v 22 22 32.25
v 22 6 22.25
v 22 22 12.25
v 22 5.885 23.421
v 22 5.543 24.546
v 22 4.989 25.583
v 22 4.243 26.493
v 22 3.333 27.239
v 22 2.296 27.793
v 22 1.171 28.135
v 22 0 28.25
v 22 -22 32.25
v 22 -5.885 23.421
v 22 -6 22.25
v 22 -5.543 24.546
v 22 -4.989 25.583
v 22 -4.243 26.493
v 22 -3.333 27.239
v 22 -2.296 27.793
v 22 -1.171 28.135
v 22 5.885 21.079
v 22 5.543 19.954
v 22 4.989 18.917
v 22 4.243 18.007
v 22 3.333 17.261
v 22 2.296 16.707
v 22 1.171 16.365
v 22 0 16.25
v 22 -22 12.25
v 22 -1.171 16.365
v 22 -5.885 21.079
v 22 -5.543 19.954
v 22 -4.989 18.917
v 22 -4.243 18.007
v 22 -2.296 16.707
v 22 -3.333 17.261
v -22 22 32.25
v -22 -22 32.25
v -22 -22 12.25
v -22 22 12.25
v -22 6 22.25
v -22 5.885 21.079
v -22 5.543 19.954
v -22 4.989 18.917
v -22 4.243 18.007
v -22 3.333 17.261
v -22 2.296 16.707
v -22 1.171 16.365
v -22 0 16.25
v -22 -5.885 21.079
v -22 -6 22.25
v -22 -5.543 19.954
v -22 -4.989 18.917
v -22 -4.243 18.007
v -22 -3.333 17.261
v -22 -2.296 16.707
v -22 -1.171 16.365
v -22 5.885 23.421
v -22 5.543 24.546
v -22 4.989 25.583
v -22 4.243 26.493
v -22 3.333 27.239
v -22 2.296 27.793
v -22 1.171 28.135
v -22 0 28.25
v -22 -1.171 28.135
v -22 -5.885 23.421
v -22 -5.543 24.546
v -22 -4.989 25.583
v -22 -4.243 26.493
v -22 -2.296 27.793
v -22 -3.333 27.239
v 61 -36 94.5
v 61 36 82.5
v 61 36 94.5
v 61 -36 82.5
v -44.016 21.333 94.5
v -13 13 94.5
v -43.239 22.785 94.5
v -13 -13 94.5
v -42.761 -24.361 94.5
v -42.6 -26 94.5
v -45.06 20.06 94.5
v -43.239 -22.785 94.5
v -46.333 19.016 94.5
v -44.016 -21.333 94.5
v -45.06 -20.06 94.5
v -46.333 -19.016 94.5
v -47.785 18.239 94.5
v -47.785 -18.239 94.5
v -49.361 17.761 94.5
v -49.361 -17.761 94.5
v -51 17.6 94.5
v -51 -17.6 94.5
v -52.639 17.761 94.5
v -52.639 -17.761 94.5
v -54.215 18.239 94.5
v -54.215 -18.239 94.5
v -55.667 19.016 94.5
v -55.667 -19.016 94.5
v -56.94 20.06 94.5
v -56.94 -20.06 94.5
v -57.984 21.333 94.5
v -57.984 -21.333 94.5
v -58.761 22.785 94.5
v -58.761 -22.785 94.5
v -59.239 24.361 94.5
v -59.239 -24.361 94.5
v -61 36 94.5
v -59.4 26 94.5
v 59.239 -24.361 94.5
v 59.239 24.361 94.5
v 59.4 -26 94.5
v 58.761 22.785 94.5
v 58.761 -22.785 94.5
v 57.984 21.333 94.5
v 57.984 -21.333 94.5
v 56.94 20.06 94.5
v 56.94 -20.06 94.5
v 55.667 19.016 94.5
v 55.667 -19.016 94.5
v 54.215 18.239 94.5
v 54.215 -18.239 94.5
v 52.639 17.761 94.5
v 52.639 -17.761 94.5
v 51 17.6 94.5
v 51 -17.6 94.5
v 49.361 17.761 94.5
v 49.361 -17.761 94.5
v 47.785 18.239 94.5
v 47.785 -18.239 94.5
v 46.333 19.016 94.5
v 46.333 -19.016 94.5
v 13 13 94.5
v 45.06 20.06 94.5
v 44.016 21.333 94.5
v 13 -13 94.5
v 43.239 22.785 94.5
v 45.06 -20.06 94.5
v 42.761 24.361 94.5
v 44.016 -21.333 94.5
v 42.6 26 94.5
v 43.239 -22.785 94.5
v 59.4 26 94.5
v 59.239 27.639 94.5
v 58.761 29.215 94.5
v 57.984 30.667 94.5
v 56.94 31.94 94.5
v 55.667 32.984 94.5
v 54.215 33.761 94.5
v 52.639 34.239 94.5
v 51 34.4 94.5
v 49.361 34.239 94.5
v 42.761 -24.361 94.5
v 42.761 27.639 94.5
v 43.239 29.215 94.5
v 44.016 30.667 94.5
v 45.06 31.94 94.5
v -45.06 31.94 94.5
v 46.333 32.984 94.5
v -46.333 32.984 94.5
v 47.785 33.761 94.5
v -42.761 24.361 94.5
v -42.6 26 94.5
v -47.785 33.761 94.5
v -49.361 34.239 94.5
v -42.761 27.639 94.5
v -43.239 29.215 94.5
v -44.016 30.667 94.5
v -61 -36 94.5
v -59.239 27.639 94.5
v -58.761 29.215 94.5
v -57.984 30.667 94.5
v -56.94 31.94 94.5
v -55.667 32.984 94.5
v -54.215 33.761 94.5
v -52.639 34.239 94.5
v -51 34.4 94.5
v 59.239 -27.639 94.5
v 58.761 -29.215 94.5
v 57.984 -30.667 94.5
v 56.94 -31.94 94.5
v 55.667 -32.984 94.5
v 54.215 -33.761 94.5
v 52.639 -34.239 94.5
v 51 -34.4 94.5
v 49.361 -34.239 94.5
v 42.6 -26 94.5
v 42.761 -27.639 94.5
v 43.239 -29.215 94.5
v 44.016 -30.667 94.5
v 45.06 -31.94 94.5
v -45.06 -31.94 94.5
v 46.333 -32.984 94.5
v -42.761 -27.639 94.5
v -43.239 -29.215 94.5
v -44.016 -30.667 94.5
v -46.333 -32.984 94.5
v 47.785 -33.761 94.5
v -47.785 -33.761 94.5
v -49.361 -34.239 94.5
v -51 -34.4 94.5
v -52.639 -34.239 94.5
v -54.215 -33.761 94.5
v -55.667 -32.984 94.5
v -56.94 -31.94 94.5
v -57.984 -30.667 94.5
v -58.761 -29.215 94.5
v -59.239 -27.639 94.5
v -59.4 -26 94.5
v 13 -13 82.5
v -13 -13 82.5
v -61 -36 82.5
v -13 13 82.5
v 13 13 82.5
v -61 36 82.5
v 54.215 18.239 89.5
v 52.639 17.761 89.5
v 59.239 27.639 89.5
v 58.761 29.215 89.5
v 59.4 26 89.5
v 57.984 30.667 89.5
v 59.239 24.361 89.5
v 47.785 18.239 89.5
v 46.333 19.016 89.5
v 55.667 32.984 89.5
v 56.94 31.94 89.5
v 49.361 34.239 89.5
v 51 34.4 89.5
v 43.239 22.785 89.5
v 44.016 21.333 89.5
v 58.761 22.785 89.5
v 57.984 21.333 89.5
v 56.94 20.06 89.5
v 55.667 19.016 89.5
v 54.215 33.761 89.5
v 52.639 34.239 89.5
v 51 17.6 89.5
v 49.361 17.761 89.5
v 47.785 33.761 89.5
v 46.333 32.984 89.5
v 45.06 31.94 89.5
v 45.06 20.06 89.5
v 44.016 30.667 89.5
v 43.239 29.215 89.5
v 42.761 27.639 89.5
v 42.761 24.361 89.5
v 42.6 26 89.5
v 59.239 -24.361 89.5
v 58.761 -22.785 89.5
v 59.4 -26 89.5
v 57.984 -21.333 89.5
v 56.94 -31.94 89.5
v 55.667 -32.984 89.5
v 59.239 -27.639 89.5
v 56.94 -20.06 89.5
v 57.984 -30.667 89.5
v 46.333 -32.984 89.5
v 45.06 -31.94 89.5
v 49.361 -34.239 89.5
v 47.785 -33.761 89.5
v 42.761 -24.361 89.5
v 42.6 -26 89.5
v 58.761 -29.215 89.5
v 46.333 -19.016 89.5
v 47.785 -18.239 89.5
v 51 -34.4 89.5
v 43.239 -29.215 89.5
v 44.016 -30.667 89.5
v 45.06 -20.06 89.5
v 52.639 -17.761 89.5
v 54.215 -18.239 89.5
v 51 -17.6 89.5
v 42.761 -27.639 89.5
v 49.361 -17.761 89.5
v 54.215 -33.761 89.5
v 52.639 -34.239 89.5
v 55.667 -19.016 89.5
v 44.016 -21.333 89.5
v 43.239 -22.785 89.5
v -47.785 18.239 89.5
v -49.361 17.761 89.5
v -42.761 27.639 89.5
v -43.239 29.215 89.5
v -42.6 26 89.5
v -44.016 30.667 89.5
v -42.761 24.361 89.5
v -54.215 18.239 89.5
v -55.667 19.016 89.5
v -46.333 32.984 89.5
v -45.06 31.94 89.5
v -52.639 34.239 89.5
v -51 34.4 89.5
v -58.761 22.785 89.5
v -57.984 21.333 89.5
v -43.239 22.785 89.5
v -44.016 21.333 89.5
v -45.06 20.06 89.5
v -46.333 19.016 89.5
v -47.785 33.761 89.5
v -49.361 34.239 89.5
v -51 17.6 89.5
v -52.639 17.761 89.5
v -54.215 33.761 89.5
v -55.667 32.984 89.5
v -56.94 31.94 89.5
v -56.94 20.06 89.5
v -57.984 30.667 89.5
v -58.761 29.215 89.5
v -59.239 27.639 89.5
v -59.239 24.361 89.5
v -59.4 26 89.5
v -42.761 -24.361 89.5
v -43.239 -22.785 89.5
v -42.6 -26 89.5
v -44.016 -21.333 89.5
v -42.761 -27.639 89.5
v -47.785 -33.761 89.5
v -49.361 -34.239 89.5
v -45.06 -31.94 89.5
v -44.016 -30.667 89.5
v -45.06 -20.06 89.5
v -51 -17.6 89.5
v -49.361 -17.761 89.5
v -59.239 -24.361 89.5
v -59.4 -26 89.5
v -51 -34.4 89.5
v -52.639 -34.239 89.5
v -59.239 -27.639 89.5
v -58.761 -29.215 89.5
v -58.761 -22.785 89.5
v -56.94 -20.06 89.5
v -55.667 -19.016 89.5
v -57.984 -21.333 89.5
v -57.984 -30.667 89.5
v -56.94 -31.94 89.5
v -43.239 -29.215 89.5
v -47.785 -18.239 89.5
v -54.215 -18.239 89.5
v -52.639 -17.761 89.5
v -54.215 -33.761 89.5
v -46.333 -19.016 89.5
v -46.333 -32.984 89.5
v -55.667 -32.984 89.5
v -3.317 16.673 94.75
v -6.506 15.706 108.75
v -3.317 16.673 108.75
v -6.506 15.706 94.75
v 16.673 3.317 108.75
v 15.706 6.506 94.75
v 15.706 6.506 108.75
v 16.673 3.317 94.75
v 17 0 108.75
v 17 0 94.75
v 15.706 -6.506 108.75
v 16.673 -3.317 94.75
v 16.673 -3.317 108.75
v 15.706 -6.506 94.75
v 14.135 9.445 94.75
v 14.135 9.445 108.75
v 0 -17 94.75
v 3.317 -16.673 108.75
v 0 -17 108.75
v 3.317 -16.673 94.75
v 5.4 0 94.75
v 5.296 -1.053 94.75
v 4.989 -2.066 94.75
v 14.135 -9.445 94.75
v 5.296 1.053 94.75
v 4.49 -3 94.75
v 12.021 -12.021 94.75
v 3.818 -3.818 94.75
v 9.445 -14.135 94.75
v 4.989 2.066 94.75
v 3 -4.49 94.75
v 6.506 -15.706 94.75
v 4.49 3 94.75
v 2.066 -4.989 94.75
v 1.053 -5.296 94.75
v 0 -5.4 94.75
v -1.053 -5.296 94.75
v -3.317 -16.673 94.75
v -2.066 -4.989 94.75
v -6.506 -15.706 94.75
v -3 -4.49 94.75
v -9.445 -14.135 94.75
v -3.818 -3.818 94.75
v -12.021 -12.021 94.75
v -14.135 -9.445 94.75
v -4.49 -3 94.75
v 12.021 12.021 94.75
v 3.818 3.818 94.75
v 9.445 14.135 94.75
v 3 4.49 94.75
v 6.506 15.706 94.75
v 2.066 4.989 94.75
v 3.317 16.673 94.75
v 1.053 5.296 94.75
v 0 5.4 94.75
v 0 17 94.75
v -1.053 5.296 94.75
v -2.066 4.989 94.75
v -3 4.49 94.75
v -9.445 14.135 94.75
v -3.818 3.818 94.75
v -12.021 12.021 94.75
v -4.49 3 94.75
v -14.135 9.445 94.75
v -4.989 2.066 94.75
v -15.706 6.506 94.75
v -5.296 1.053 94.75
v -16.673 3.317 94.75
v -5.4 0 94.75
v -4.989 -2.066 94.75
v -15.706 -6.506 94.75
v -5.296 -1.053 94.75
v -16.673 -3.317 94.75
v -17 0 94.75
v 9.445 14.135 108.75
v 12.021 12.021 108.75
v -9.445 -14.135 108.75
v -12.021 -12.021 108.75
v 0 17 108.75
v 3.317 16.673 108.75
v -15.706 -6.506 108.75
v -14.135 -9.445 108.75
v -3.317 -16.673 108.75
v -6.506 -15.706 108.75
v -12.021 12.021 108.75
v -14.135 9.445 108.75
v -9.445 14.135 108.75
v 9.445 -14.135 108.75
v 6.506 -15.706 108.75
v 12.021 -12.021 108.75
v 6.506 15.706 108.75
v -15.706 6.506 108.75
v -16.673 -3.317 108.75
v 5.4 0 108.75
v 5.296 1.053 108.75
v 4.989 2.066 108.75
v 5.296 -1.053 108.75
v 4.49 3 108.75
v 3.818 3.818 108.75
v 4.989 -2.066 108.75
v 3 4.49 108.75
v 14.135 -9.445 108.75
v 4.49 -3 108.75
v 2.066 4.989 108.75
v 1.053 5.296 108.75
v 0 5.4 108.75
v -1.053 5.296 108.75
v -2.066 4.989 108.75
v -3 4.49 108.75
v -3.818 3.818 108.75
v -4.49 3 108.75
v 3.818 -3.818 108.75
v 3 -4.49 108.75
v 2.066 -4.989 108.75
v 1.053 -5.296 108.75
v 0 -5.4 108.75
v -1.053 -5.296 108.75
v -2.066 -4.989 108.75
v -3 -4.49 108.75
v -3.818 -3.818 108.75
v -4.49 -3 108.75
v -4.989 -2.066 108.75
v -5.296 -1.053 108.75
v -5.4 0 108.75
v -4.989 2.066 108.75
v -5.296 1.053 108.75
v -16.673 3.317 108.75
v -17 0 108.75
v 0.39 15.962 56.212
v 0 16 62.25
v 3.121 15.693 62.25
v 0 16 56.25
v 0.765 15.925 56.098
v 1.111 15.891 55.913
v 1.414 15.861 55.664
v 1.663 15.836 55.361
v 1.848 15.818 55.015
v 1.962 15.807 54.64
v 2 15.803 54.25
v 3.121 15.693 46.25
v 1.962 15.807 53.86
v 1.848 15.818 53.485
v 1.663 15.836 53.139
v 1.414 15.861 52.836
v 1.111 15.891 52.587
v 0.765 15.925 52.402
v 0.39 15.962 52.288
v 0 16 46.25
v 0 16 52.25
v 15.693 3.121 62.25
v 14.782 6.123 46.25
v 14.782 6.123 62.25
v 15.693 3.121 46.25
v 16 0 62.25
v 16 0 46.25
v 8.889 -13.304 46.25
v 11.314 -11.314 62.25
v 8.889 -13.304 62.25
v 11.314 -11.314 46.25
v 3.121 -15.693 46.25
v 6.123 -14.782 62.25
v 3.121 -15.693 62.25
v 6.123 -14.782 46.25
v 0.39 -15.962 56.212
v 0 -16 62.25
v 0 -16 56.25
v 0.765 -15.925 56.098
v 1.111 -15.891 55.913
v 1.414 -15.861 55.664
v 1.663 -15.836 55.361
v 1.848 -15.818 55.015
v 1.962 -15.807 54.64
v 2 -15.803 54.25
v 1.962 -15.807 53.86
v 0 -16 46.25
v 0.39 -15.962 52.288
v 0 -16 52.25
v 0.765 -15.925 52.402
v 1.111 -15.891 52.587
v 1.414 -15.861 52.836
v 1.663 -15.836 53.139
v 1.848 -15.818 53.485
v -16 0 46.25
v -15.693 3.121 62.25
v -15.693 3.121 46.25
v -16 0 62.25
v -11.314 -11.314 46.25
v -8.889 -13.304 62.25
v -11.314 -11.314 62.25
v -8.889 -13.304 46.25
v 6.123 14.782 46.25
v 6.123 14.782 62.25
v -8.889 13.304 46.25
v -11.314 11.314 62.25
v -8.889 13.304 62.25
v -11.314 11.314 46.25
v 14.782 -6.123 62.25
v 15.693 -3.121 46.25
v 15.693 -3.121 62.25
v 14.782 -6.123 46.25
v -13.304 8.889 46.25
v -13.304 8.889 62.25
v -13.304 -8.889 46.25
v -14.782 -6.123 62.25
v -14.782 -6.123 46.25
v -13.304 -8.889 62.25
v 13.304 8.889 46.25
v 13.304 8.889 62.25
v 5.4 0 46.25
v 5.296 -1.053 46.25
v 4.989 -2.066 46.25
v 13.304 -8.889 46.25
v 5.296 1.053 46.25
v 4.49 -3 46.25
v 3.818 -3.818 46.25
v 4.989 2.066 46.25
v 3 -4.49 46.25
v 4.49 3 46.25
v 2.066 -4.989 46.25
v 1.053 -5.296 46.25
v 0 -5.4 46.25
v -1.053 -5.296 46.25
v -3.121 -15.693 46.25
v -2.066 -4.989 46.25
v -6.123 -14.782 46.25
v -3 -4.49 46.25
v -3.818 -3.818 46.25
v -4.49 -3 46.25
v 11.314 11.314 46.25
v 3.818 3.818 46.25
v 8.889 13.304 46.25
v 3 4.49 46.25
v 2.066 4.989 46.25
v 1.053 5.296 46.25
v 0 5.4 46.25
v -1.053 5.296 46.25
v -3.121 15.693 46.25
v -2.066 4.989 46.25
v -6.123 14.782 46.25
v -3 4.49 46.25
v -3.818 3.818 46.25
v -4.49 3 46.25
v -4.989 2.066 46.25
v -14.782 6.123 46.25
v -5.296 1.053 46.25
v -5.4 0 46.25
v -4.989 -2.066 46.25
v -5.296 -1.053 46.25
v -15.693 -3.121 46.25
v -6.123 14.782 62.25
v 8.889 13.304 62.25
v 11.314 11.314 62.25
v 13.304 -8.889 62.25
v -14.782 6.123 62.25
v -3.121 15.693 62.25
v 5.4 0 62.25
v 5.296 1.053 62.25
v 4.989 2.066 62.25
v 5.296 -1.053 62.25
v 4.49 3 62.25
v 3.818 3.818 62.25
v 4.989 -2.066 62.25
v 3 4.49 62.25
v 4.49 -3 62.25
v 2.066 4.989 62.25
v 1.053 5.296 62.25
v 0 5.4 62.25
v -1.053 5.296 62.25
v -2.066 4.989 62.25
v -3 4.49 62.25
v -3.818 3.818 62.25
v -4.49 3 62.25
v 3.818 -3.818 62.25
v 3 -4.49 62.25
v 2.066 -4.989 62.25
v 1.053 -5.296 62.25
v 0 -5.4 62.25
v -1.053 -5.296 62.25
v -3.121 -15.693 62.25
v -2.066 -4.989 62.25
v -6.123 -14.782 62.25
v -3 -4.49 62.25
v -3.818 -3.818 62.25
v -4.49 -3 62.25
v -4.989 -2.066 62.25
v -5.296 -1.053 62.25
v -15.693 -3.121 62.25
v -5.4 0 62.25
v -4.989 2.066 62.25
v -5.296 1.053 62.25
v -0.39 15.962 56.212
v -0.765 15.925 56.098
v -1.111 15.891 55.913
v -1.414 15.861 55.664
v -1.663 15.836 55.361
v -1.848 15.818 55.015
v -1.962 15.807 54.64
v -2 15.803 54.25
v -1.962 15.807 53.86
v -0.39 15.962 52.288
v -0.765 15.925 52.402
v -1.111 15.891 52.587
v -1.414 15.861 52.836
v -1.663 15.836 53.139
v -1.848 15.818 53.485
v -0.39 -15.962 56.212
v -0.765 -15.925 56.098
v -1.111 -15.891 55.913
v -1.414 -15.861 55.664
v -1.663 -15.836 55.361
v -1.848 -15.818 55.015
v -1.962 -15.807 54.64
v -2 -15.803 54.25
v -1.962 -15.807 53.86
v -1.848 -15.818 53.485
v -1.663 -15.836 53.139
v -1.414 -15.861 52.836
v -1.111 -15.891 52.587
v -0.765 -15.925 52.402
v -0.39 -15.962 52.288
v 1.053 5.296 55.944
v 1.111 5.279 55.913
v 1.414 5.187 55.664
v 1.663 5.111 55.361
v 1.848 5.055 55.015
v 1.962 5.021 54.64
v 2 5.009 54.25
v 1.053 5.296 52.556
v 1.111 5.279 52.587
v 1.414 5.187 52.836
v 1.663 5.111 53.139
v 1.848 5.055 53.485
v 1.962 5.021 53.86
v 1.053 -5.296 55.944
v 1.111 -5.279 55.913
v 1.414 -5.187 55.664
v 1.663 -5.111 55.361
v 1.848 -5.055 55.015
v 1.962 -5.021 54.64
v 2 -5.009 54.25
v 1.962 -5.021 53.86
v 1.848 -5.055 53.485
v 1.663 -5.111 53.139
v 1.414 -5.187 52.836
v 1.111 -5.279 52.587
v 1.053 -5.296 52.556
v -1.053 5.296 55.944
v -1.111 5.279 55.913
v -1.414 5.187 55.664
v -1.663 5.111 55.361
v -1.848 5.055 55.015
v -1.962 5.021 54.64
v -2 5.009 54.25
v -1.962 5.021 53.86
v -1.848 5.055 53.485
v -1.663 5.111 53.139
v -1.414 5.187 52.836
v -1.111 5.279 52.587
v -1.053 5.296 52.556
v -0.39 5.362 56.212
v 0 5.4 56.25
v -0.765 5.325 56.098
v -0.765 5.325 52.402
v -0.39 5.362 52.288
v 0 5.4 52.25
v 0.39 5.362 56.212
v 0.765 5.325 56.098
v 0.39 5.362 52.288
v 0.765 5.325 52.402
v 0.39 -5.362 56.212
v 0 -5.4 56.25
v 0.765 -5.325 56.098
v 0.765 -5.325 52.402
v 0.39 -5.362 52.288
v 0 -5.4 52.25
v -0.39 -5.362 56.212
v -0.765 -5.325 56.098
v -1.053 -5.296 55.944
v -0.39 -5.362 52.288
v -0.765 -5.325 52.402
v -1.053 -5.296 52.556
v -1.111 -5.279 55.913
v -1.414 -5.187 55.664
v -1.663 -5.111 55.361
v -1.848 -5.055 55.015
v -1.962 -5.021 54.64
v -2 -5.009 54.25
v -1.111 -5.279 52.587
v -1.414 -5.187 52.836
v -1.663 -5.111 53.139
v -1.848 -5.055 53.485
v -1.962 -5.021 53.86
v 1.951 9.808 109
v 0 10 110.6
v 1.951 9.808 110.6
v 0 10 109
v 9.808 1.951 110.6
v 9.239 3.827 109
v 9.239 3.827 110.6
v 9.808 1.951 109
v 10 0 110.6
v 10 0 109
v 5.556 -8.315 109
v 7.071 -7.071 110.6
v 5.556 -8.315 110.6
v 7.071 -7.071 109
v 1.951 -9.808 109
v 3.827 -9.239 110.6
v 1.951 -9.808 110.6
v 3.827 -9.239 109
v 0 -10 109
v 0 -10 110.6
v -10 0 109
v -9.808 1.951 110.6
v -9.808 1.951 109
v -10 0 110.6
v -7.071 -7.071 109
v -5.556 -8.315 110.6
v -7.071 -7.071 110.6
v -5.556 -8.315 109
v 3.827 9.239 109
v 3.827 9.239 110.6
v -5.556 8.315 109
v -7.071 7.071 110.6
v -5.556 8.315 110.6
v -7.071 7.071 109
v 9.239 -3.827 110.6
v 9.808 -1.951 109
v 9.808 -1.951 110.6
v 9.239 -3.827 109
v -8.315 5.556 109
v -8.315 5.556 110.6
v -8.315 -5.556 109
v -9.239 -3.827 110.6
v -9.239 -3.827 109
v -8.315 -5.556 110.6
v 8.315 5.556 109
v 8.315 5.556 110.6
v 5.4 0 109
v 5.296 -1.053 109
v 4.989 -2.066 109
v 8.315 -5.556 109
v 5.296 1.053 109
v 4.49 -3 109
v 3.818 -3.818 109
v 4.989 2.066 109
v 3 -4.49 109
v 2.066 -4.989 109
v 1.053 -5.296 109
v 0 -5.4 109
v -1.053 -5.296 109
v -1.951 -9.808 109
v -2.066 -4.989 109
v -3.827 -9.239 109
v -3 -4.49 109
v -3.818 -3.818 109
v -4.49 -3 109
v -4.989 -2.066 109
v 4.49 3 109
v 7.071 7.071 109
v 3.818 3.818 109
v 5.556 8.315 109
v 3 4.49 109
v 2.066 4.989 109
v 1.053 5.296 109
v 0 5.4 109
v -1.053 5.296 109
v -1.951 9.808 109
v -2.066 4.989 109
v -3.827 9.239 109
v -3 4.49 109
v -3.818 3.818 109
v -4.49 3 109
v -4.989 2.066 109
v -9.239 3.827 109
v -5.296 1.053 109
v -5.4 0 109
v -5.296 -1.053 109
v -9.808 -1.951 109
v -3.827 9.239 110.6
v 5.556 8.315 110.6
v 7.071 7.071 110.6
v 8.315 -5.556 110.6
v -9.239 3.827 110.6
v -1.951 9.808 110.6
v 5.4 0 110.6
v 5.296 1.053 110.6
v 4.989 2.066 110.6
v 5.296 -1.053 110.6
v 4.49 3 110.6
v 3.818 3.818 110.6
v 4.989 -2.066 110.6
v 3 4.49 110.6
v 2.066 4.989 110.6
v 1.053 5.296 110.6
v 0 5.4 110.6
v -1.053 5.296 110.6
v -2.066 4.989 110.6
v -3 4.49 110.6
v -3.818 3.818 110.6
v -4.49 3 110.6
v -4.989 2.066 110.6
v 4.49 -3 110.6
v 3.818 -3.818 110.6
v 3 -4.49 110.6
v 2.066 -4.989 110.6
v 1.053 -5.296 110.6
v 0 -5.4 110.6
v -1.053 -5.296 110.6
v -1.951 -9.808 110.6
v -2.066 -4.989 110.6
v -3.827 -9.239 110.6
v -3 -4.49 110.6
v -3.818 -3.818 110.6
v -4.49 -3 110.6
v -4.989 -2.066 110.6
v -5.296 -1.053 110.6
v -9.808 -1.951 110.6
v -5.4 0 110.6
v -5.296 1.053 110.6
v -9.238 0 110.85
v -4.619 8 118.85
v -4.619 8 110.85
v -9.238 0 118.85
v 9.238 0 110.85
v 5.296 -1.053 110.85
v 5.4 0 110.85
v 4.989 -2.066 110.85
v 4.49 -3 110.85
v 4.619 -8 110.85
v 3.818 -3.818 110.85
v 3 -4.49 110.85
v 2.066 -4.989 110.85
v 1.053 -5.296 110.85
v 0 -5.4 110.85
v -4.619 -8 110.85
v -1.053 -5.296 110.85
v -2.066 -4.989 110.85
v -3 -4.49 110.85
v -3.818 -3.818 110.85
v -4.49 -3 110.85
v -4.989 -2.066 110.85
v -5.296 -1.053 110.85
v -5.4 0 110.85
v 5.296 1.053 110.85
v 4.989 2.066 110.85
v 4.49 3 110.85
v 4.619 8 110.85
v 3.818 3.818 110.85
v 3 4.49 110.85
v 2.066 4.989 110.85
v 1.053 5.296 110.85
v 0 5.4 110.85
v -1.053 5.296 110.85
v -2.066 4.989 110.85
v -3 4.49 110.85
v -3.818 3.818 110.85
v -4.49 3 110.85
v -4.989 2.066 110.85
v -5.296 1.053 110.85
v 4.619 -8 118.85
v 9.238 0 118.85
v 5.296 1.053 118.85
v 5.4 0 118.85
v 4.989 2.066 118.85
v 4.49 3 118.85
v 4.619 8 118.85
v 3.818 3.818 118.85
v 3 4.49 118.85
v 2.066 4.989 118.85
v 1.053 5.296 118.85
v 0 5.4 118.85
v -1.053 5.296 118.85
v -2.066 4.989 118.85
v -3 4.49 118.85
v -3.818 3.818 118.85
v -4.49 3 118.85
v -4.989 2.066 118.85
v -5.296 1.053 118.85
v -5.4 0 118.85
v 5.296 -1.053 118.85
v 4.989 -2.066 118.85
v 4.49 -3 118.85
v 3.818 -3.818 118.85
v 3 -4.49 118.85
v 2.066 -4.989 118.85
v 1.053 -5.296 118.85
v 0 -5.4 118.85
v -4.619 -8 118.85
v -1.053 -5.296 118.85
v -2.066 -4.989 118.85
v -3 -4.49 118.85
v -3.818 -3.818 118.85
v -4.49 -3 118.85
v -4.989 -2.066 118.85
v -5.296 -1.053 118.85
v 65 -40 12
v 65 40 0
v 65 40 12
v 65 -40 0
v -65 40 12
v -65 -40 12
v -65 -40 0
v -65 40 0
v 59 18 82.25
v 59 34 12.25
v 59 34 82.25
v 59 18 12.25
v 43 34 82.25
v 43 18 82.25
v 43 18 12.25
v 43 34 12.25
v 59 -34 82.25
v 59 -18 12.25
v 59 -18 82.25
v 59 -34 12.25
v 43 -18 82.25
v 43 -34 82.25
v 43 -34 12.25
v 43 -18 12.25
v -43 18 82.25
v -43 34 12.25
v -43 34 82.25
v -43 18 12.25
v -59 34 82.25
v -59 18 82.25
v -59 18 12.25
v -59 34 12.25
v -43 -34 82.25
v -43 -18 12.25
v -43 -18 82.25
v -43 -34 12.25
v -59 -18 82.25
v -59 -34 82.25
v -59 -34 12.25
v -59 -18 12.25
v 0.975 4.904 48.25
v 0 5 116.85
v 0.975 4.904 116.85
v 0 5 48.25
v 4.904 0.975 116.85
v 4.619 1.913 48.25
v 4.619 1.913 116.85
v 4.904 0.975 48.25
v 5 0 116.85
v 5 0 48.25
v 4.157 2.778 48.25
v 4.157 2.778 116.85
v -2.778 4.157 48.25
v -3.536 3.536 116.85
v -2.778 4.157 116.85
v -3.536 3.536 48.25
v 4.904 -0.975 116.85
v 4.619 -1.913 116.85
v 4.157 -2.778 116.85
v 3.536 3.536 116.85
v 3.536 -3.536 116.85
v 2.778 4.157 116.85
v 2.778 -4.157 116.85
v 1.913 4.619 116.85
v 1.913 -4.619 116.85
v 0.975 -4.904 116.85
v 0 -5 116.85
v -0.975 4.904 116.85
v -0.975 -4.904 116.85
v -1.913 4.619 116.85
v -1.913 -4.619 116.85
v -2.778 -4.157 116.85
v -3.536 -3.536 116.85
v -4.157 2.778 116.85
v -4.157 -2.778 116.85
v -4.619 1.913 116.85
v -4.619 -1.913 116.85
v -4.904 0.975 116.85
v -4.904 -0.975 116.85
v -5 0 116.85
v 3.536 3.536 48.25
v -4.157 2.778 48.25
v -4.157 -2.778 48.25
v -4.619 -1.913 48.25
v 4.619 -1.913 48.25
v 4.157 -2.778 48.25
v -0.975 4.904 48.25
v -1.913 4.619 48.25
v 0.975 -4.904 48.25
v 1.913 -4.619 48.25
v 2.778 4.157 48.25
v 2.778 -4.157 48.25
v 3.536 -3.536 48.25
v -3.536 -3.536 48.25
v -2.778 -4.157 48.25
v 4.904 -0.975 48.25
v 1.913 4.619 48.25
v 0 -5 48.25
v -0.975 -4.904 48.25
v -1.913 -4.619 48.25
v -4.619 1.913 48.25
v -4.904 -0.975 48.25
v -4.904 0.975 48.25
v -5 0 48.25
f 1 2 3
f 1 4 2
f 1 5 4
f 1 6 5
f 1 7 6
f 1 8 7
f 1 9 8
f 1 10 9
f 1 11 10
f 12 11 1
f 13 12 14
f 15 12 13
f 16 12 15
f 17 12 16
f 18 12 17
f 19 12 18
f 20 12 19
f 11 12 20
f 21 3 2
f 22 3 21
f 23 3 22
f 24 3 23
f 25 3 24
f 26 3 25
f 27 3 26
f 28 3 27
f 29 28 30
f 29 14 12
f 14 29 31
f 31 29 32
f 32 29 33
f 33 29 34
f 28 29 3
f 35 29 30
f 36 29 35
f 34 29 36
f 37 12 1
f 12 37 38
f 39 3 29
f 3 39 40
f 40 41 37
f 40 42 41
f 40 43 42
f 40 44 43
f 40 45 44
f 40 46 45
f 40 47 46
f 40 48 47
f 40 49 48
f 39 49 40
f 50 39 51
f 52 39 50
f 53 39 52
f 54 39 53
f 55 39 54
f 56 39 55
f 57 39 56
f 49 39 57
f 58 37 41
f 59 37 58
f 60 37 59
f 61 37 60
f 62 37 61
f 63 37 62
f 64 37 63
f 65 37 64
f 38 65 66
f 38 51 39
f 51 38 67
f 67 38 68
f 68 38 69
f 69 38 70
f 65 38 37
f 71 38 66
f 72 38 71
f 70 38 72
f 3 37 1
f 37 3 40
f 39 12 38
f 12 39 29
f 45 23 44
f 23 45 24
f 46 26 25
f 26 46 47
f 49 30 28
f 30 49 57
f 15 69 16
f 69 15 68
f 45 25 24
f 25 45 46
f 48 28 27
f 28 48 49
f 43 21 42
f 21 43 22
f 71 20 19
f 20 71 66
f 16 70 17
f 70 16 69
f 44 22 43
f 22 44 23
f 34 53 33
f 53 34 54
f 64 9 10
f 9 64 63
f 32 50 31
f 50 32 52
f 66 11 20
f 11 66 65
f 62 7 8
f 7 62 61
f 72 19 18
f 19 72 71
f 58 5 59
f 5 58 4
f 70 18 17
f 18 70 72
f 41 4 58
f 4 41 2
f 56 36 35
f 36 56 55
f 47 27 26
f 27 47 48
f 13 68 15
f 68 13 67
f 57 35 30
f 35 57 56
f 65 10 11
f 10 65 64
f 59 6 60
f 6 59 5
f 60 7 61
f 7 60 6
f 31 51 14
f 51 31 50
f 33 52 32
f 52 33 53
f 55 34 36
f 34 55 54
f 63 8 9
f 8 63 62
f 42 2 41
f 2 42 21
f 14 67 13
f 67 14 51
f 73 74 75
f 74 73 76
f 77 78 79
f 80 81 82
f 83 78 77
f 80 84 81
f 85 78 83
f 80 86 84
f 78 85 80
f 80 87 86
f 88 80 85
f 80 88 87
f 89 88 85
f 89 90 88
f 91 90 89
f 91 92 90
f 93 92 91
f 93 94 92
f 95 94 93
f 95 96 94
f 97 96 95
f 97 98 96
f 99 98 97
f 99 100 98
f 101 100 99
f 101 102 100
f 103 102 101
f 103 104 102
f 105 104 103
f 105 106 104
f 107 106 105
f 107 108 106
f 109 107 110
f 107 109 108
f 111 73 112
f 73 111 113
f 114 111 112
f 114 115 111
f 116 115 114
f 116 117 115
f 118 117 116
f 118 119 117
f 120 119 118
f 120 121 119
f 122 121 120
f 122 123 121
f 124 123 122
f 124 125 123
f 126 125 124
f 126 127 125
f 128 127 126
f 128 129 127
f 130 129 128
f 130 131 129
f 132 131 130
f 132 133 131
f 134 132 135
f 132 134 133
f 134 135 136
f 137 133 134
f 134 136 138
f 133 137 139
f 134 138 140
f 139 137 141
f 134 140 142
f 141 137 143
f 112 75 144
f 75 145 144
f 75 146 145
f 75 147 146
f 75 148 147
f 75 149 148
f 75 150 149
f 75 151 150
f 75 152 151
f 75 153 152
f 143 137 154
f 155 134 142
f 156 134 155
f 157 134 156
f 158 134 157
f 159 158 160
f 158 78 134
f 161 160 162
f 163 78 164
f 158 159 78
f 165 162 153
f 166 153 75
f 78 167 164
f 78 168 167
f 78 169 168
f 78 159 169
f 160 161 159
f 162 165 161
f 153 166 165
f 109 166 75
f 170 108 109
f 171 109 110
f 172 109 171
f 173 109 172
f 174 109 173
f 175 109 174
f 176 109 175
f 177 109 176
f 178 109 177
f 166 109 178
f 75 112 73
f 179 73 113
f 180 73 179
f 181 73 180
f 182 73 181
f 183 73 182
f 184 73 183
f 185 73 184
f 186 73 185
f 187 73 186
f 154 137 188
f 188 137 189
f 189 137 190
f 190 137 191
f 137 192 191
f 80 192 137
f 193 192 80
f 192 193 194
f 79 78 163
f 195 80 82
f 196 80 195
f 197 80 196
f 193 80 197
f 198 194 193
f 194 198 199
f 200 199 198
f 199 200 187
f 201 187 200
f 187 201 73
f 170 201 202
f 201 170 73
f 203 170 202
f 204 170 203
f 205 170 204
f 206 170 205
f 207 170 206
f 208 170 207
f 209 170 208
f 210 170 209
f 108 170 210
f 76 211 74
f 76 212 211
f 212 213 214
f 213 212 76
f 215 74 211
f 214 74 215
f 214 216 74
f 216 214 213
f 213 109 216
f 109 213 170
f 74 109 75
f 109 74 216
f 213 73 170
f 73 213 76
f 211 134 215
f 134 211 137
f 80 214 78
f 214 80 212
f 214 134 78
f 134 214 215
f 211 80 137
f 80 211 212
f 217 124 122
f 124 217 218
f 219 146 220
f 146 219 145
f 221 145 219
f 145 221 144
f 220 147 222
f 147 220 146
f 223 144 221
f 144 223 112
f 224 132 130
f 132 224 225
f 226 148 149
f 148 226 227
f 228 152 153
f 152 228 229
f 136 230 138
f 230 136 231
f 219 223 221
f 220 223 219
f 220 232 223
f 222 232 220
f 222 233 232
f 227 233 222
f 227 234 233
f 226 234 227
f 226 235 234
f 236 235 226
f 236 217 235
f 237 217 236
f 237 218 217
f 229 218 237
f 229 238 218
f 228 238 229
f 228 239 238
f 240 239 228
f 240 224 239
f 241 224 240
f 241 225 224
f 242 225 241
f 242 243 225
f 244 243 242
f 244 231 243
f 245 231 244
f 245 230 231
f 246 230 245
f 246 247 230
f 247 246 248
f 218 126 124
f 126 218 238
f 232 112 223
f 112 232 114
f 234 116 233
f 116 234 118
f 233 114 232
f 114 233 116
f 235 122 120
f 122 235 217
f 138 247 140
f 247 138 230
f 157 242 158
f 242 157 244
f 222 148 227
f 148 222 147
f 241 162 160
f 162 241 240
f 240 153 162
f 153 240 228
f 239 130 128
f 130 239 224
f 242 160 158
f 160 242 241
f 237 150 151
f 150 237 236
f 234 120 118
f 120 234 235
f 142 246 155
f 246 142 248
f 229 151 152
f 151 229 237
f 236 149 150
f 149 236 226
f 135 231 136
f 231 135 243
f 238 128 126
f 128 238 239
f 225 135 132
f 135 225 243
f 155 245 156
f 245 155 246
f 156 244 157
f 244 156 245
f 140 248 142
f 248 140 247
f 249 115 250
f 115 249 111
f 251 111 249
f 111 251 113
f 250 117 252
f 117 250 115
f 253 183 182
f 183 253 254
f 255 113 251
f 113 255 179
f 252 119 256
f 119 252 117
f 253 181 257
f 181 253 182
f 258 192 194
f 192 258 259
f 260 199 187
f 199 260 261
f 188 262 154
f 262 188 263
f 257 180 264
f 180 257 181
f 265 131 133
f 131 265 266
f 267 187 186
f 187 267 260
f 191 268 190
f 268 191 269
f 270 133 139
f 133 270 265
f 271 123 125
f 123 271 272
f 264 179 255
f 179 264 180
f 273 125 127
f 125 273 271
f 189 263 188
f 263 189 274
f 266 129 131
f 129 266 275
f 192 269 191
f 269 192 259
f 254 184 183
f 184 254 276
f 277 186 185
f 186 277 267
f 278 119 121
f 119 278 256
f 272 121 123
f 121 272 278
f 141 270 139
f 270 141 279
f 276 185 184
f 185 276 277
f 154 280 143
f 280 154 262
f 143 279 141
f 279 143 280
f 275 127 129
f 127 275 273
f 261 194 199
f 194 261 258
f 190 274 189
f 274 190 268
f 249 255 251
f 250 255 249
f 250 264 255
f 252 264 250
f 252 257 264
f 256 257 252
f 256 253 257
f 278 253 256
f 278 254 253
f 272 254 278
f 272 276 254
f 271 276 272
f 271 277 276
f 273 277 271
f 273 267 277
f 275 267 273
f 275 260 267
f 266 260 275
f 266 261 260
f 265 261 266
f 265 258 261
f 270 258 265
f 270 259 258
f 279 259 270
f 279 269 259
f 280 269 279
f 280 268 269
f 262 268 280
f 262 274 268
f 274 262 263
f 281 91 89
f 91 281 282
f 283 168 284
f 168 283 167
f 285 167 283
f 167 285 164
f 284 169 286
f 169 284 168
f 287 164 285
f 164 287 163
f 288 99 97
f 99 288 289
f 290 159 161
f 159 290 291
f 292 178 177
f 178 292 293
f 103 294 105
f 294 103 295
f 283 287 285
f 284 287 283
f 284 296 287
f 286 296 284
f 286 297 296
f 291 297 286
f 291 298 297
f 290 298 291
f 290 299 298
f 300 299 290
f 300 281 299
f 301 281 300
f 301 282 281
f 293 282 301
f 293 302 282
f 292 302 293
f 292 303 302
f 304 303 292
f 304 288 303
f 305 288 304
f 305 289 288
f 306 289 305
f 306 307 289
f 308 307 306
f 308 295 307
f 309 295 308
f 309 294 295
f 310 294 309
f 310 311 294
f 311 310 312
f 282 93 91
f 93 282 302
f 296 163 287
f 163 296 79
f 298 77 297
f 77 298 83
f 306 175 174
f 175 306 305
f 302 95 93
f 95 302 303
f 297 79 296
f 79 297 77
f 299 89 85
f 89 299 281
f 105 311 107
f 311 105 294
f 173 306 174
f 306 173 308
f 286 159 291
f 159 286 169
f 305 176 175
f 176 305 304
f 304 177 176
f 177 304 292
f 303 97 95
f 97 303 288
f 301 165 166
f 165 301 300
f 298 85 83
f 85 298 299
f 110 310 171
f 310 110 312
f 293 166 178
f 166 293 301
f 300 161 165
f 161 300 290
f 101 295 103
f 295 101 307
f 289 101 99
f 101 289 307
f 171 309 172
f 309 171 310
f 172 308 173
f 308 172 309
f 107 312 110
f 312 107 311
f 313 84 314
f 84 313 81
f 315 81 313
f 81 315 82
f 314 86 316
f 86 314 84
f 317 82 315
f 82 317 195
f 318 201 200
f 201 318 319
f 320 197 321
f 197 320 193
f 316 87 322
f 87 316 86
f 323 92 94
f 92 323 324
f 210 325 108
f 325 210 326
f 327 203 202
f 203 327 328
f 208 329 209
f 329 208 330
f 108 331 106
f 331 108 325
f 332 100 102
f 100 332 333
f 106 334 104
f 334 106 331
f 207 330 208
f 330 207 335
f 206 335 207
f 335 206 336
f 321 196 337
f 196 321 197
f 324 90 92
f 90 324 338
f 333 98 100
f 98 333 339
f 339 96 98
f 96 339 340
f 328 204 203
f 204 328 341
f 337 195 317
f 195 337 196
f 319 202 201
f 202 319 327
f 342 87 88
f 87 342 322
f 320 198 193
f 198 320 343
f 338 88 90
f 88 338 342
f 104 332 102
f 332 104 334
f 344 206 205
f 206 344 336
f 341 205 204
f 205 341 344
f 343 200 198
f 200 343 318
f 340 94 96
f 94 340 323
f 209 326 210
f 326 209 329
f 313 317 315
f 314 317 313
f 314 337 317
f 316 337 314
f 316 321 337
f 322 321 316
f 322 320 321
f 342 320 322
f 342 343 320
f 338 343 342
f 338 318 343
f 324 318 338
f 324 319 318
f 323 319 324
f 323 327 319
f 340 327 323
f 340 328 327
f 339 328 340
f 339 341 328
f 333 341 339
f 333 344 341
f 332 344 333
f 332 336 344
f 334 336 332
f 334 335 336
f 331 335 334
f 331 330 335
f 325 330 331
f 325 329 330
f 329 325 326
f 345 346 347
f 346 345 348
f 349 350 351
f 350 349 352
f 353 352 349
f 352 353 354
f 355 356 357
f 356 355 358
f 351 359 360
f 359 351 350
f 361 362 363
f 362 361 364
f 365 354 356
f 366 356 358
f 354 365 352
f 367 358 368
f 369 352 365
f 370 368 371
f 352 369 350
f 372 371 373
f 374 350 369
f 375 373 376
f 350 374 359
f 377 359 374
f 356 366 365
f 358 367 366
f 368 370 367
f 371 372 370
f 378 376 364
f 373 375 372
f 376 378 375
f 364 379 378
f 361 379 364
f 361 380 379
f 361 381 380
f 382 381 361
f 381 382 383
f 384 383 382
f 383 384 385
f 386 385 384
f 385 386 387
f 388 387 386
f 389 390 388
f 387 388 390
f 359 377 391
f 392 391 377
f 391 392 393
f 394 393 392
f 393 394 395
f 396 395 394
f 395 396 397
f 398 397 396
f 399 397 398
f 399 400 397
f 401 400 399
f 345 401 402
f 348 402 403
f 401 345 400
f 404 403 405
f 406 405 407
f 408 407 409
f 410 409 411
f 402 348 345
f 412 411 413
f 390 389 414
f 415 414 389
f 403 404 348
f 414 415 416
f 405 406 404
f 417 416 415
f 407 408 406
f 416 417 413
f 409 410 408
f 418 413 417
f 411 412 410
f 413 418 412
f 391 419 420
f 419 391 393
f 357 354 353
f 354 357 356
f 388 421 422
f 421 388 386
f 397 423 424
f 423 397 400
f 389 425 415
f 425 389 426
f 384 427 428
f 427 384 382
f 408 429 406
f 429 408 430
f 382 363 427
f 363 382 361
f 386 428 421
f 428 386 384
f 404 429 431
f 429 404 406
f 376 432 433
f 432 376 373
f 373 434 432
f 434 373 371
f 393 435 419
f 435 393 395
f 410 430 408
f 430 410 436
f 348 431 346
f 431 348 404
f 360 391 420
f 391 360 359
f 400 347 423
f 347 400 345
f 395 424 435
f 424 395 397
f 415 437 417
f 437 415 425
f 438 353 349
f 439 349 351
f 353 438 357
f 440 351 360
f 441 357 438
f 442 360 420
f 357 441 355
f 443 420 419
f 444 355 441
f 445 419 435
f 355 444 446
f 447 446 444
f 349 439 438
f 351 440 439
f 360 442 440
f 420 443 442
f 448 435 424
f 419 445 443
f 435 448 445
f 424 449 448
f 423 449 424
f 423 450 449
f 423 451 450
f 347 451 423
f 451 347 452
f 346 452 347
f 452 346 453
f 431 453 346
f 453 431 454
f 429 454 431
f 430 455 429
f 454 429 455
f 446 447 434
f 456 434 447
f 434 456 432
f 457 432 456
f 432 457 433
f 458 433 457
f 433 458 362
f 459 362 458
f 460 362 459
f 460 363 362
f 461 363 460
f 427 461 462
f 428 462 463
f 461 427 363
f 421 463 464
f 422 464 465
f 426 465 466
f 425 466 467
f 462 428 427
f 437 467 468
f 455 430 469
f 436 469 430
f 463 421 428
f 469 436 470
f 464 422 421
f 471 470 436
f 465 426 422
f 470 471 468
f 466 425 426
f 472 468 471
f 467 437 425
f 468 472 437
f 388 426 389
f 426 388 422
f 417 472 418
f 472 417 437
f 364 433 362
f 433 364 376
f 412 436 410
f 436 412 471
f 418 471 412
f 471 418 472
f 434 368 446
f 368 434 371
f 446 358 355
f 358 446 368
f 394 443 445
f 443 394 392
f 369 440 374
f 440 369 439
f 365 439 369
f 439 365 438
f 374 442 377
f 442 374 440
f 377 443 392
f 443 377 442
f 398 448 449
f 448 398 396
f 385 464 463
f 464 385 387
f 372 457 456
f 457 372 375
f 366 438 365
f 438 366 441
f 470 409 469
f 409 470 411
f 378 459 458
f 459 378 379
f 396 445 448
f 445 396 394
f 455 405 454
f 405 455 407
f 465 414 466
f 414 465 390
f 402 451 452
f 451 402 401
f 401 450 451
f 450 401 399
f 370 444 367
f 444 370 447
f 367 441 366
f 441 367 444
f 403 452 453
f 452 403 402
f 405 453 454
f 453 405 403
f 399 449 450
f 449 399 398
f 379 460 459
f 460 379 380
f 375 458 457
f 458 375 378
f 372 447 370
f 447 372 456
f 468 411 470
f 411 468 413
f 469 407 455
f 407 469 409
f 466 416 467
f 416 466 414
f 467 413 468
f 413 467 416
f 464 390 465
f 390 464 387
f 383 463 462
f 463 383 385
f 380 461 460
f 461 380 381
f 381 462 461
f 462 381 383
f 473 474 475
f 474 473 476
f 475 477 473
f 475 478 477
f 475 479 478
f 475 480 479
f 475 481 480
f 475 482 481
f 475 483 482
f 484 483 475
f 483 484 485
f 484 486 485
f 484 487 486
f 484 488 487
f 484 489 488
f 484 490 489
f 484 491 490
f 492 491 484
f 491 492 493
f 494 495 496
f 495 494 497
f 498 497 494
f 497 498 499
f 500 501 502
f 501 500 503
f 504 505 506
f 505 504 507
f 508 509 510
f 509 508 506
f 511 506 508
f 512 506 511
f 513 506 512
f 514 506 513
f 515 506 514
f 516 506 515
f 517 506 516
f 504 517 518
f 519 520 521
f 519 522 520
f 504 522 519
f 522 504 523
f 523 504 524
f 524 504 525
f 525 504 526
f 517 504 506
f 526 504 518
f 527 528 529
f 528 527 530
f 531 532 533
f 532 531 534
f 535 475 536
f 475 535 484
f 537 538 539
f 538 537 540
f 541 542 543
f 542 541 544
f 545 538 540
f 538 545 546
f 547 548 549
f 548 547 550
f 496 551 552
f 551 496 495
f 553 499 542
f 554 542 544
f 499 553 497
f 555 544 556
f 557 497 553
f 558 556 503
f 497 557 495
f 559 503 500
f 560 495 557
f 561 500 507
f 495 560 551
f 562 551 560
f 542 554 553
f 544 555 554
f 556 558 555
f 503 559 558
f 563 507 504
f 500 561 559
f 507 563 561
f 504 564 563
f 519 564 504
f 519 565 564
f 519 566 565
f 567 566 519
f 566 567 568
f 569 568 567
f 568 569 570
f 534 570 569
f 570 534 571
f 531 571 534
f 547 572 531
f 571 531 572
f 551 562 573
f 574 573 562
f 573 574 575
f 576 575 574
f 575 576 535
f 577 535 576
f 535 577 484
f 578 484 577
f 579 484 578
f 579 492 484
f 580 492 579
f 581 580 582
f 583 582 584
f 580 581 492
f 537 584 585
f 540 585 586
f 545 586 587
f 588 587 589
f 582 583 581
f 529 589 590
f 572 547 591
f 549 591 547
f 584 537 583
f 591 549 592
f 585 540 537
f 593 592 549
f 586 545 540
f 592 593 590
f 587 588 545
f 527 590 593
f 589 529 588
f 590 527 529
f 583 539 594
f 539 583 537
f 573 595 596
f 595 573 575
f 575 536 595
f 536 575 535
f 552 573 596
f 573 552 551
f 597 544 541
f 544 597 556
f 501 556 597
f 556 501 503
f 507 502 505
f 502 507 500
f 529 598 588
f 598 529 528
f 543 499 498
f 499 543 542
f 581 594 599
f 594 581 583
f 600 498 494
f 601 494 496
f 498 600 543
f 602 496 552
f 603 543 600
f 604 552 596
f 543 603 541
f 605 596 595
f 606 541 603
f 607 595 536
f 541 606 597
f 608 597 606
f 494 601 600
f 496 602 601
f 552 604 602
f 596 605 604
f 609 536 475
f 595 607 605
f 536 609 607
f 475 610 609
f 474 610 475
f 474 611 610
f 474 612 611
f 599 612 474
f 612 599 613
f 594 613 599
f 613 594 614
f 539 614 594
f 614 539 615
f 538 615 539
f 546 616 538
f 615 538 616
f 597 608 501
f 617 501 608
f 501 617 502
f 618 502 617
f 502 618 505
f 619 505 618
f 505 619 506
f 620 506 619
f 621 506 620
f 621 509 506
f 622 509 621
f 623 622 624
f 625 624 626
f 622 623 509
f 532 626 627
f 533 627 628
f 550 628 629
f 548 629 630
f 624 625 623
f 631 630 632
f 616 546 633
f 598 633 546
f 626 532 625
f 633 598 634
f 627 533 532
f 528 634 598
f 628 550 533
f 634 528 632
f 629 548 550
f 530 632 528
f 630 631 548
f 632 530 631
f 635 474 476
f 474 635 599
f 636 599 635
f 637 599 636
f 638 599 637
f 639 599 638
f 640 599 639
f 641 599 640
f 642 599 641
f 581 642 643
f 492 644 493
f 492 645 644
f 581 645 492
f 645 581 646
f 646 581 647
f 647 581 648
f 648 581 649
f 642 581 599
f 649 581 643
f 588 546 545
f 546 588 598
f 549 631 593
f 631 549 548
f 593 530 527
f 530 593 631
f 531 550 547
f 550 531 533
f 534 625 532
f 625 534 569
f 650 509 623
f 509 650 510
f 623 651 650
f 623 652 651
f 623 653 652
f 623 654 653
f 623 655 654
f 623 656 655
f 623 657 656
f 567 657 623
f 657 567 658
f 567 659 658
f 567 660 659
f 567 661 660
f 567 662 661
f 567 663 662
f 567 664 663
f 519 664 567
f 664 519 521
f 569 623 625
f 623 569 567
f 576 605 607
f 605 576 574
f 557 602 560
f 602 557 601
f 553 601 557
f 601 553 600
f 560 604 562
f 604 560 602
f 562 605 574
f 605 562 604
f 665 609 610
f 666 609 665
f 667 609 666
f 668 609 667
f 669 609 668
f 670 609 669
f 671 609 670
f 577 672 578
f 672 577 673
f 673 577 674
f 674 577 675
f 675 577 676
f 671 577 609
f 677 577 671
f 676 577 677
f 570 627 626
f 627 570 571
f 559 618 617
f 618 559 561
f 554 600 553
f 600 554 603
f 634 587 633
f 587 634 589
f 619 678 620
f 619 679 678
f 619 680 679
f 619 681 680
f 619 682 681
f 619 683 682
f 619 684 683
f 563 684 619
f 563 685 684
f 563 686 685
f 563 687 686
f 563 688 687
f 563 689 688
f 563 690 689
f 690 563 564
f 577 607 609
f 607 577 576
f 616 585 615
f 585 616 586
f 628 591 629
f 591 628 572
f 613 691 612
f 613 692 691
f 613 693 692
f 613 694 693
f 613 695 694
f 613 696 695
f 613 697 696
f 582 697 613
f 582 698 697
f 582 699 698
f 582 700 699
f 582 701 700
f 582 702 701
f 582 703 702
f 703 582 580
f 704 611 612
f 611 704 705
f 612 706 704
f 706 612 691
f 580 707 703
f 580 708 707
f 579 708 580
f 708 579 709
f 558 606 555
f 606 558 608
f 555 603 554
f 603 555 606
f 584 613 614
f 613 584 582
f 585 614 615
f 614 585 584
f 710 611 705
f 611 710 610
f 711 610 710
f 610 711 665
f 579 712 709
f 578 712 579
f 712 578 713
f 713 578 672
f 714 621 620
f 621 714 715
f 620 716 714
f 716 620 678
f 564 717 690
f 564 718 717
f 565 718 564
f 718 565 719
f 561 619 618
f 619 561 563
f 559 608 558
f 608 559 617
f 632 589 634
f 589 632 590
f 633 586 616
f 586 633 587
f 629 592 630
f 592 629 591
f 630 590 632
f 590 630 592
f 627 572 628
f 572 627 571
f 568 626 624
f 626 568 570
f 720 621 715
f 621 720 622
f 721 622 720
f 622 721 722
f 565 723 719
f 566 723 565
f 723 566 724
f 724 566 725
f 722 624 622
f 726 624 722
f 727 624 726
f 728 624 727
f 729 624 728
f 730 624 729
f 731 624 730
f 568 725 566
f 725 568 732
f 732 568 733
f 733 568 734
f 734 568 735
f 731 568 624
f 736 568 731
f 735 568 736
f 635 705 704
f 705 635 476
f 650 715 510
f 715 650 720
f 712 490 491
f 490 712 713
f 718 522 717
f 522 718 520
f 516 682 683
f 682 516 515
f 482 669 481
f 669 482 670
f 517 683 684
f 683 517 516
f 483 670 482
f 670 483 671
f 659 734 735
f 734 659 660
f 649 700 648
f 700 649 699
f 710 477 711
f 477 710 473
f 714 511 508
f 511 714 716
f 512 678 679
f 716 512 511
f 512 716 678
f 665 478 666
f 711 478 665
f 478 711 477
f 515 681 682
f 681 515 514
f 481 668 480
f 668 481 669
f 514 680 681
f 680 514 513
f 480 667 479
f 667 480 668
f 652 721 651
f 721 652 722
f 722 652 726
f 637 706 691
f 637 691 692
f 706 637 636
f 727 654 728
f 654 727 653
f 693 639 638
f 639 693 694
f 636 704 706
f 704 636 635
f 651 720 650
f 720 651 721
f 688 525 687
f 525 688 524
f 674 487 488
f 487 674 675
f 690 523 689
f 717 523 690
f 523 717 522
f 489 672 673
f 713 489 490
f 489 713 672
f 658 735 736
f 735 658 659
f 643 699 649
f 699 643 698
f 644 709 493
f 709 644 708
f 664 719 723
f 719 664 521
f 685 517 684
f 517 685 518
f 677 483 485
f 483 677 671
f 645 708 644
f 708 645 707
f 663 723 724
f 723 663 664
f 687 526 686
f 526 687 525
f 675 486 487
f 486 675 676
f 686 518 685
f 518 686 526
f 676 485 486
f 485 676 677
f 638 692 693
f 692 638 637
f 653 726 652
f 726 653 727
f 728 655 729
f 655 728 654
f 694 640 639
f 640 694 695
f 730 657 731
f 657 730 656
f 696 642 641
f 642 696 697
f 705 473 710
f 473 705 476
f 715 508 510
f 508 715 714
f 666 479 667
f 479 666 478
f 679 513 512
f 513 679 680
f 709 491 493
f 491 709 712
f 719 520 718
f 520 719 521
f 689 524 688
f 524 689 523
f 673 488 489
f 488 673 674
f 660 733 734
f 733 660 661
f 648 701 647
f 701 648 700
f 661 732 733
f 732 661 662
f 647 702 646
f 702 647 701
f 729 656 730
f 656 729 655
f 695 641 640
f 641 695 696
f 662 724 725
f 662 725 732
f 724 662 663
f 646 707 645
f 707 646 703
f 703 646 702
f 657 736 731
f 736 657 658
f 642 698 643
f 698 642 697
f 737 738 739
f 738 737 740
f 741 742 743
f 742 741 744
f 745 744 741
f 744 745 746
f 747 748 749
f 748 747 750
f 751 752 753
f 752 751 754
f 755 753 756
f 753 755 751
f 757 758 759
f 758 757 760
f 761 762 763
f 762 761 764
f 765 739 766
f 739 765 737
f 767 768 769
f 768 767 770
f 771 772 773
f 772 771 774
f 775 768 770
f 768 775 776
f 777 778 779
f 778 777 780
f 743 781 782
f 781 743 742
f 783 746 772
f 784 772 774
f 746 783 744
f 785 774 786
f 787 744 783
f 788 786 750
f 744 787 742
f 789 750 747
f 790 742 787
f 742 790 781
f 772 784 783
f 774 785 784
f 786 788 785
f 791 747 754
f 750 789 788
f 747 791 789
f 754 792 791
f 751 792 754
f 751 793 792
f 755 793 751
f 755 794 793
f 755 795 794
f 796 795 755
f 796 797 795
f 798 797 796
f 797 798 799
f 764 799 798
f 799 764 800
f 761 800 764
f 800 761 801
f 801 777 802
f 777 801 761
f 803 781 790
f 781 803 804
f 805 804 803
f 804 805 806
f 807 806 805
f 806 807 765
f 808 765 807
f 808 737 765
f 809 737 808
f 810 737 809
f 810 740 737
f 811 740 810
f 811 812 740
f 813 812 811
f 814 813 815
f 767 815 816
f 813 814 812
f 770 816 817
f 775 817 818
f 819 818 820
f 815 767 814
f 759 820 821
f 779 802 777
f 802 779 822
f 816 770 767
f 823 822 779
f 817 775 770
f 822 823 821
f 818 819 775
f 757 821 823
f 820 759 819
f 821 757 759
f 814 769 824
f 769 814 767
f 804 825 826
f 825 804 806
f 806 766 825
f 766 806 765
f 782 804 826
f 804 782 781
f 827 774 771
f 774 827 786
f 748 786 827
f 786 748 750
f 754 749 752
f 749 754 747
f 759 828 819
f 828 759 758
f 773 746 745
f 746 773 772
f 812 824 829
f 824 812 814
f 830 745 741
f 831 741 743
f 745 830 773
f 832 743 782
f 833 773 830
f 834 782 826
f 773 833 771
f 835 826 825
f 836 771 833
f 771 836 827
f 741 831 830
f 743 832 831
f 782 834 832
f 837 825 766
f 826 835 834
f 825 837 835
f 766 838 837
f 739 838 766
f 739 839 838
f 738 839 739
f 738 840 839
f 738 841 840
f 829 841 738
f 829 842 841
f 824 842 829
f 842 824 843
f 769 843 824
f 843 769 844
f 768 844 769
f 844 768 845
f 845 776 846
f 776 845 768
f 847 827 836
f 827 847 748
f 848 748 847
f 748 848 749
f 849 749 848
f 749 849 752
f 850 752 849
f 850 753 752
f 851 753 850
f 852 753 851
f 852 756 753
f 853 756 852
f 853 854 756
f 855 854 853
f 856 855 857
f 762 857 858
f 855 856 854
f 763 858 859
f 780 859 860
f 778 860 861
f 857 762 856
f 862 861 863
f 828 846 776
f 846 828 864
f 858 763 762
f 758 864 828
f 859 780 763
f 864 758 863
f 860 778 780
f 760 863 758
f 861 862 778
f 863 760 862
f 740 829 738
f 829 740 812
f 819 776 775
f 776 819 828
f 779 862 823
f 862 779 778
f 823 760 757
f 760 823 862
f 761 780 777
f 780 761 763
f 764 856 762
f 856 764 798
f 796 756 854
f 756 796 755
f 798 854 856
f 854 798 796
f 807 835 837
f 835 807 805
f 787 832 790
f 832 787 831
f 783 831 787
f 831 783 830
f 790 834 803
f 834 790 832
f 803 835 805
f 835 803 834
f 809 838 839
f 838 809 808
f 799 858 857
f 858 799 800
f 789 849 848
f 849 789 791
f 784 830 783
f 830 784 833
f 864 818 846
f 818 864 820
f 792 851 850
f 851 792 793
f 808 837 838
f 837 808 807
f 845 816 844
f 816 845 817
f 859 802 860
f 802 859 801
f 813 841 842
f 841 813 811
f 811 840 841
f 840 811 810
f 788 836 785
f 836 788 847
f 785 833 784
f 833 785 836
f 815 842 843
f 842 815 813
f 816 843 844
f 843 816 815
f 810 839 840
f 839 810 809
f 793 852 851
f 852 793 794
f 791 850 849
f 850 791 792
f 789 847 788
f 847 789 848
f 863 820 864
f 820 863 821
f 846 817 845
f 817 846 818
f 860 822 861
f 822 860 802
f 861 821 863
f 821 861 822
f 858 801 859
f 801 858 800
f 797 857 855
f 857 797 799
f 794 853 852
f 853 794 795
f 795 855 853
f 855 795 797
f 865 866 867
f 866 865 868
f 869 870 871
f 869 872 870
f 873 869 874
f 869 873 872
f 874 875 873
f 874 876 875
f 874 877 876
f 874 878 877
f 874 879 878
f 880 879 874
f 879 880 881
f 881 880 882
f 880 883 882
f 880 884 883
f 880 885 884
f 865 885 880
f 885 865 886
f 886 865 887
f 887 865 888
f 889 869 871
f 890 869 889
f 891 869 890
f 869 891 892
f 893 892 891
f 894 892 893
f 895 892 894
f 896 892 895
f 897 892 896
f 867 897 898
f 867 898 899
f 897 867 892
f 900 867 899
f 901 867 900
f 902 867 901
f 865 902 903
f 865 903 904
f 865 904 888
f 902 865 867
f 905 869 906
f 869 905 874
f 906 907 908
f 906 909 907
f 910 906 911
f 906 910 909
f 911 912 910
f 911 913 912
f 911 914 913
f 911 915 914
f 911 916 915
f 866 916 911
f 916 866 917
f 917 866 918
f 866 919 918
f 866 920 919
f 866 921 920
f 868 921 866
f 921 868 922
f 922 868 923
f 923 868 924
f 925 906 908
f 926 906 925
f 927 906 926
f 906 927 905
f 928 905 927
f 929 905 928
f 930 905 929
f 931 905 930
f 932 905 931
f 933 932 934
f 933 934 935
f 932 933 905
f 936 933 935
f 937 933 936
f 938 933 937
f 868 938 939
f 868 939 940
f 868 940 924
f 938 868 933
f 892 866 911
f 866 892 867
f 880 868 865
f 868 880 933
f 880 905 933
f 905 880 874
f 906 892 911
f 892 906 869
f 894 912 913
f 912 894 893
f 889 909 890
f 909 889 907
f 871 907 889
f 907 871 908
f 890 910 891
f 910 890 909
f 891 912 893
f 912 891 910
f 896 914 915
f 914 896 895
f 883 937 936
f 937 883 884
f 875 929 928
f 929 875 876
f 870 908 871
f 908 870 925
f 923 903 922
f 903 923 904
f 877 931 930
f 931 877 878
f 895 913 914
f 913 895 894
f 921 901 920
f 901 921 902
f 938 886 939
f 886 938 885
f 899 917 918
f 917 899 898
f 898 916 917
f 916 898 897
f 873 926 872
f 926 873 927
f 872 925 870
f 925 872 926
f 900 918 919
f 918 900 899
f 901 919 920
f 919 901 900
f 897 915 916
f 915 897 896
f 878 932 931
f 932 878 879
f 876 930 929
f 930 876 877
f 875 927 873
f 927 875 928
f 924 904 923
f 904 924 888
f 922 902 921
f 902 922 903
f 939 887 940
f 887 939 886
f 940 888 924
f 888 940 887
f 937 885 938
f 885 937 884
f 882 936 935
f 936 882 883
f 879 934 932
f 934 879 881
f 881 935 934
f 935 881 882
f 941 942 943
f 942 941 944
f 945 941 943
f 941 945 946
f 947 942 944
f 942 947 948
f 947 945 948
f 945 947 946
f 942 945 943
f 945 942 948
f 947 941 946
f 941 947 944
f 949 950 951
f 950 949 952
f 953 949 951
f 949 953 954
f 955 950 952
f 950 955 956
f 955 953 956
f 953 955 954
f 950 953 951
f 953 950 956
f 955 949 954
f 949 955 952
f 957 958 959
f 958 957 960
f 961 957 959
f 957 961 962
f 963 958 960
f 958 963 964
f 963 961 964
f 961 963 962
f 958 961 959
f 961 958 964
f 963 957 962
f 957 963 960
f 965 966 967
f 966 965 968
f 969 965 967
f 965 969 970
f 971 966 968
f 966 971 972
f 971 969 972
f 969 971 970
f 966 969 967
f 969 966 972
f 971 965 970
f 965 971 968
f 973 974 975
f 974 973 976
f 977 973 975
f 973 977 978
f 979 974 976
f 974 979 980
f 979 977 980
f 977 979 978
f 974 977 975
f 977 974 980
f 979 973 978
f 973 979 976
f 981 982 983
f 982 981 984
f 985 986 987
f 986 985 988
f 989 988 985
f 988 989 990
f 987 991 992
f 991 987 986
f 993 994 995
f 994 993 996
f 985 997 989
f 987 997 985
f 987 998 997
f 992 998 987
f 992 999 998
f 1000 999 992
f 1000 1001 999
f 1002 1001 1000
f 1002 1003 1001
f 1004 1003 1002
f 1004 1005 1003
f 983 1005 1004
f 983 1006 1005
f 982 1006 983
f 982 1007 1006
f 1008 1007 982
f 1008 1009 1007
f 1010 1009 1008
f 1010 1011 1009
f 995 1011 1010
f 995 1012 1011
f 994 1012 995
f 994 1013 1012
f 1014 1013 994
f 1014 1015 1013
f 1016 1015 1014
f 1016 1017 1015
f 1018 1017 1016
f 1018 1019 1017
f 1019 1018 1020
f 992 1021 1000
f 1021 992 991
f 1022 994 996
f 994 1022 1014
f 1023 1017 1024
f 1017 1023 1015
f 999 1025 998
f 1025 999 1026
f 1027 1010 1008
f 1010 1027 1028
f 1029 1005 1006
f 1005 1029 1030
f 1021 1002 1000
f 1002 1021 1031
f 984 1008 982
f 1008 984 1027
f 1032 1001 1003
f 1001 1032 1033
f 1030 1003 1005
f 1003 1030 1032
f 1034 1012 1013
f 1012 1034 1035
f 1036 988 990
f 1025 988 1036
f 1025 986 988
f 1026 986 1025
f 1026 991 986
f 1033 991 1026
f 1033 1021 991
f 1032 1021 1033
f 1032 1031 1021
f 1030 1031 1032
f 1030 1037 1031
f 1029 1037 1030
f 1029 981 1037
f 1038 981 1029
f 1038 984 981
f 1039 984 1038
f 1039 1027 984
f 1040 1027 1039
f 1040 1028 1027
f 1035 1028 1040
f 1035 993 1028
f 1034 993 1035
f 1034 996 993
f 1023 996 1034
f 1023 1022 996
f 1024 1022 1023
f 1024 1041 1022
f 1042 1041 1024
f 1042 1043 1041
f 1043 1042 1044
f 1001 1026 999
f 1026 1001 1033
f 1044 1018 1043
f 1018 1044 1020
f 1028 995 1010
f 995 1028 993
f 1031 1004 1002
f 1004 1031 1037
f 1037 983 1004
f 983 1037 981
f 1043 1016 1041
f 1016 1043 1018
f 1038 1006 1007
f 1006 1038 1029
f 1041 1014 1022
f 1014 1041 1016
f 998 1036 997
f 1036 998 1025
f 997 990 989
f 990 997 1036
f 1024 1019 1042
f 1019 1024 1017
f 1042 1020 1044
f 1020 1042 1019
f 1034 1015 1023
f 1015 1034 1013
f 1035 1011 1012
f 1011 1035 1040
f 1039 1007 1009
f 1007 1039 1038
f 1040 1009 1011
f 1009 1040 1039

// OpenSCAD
$fn = 32;

// ------------------------------------------------------------------------
// Arbor press fixture: screw d10, posts 70 mm, gap 14 mm
// Every part is its own module, assembly() places every instance.
// ------------------------------------------------------------------------

// --- part 1 ---
module press_bed() {
  difference() {
    translate([-65, -40, 0]) cube([130, 80, 12]);
  }
}

// --- part 2 ---
module anvil_block() {
  difference() {
    translate([-22, -22, 0]) cube([44, 44, 20]);
    translate([0, 0, 10]) rotate([0, 90, 0]) cylinder(h = 46, d = 12, center = true);
  }
}

// --- part 3 ---
module press_post_a() {
  translate([-8, -8, 0]) cube([16, 16, 70]);
}

// --- part 4 ---
module press_post_b() {
  translate([-8, -8, 0]) cube([16, 16, 70]);
}

// --- part 5 ---
module press_post_c() {
  translate([-8, -8, 0]) cube([16, 16, 70]);
}

// --- part 6 ---
module press_post_d() {
  translate([-8, -8, 0]) cube([16, 16, 70]);
}

// --- part 7 ---
module press_frame() {
  difference() {
    translate([-61, -36, 0]) cube([122, 72, 12]);
    translate([-13, -13, -1]) cube([26, 26, 14]);
    translate([51, 26, 7]) cylinder(h = 6, d = 16.8);
    translate([51, -26, 7]) cylinder(h = 6, d = 16.8);
    translate([-51, 26, 7]) cylinder(h = 6, d = 16.8);
    translate([-51, -26, 7]) cylinder(h = 6, d = 16.8);
  }
}

// --- part 8 ---
module guide_ring() {
  difference() {
      translate([0, 0, 0]) cylinder(h = 14, d = 34);
      translate([0, 0, -1]) cylinder(h = 16, d = 10.8);
    }
}

// --- part 9 ---
module press_screw() {
  translate([0, 0, -34.3]) cylinder(h = 68.6, d = 10);
}

// --- part 10 ---
module press_head() {
  difference() {
    cylinder(h = 16, d = 32);
    translate([0, 0, -1]) cylinder(h = 18, d = 10.8);
    translate([0, 0, 8]) rotate([90, 0, 0]) cylinder(h = 34, d = 4, center = true);
  }
}

// --- part 11 ---
module nut_washer() {
  difference() {
      translate([0, 0, 0]) cylinder(h = 1.6, d = 20);
      translate([0, 0, -1]) cylinder(h = 3.6, d = 10.8);
    }
}

// --- part 12 ---
module press_nut() {
  difference() {
    linear_extrude(height = 8) polygon(points = [[9.238, 0], [4.619, 8], [-4.619, 8], [-9.238, 0], [-4.619, -8], [4.619, -8]]);
    translate([0, 0, -1]) cylinder(h = 10, d = 10.8);
  }
}

// --- assembly ---
module assembly() {
  color([0.80, 0.24, 0.20]) translate([0, 0, 0]) rotate([0, 0, 0]) press_bed();
  color([0.20, 0.45, 0.75]) translate([0, 0, 12.25]) rotate([0, 0, 0]) anvil_block();
  color([0.25, 0.62, 0.32]) translate([51, 26, 12.25]) rotate([0, 0, 0]) press_post_a();
  color([0.92, 0.70, 0.18]) translate([51, -26, 12.25]) rotate([0, 0, 0]) press_post_b();
  color([0.58, 0.35, 0.70]) translate([-51, 26, 12.25]) rotate([0, 0, 0]) press_post_c();
  color([0.16, 0.66, 0.66]) translate([-51, -26, 12.25]) rotate([0, 0, 0]) press_post_d();
  color([0.85, 0.48, 0.18]) translate([0, 0, 82.5]) rotate([0, 0, 0]) press_frame();
  color([0.55, 0.60, 0.65]) translate([0, 0, 94.75]) rotate([0, 0, 0]) guide_ring();
  color([0.75, 0.30, 0.55]) translate([0, 0, 82.55]) rotate([0, 0, 0]) press_screw();
  color([0.42, 0.52, 0.28]) translate([0, 0, 46.25]) rotate([0, 0, 0]) press_head();
  color([0.80, 0.24, 0.20]) translate([0, 0, 109]) rotate([0, 0, 0]) nut_washer();
  color([0.20, 0.45, 0.75]) translate([0, 0, 110.85]) rotate([0, 0, 0]) press_nut();
}

assembly();
